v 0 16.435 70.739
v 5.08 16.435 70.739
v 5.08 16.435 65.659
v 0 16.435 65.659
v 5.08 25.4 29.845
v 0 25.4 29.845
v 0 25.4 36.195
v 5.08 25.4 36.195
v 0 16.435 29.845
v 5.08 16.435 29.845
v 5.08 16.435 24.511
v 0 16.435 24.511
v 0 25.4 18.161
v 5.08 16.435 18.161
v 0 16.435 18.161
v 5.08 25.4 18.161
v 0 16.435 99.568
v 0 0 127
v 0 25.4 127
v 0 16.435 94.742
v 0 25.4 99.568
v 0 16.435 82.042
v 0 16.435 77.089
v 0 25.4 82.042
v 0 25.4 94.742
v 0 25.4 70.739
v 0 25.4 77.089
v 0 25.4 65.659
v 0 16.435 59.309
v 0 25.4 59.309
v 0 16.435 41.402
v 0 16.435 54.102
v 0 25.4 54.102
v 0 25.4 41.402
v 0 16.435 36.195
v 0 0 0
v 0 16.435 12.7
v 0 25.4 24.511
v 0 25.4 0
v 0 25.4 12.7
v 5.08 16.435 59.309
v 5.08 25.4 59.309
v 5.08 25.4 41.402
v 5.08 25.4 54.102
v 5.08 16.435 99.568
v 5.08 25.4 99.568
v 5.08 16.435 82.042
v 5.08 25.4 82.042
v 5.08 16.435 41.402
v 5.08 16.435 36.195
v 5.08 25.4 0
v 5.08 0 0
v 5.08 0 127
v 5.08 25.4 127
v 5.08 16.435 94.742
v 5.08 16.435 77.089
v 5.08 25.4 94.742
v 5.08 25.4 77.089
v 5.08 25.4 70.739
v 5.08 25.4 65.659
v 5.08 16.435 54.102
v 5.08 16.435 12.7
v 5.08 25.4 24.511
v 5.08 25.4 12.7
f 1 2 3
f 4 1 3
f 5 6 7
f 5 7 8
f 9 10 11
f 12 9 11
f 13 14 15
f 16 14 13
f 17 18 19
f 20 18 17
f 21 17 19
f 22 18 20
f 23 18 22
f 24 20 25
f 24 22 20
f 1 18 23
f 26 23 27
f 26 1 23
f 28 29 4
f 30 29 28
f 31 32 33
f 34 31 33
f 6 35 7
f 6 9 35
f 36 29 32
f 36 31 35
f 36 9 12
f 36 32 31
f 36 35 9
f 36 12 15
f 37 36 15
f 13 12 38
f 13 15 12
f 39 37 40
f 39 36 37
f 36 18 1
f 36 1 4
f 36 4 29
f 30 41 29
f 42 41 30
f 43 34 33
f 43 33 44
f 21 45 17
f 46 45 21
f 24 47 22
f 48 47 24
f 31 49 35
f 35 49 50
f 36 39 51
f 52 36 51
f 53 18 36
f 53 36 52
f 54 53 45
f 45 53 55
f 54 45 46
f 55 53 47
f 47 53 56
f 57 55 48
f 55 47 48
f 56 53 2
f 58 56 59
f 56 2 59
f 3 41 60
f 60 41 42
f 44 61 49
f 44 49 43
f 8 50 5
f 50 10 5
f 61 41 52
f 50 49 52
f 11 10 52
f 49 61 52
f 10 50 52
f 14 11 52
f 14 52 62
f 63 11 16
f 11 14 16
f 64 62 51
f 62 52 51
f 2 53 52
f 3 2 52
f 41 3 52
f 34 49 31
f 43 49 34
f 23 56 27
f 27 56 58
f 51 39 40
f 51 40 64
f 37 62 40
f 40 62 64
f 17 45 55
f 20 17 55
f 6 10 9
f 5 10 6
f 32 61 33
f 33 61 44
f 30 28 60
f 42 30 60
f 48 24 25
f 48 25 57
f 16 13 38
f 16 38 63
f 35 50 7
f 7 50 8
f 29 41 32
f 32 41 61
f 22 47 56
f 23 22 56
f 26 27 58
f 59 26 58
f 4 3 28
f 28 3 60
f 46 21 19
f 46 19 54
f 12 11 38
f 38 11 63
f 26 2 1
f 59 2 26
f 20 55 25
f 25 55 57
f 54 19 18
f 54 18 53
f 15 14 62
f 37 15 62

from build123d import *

# Parameters (mm, degrees)
SKETCH1_W           = 5.08
SKETCH1_H           = 25.4
BOSS_EXTRUDE1_DEPTH = 127
SKETCH9_W           = 5.461
SKETCH9_H           = 8.965485494
SKETCH9_W_2         = 5.334
SKETCH9_W_3         = 5.207
SKETCH9_W_4         = 5.08
SKETCH9_W_5         = 4.953
SKETCH9_W_6         = 4.826
CUT_EXTRUDE1_DEPTH  = 12.7


with BuildPart() as part:
    # Sketch1 → Boss-Extrude1 (new body)
    with BuildSketch(Plane.XY):
        with Locations((2.54, 12.7)):
            Rectangle(SKETCH1_W, SKETCH1_H)
    extrude(amount=BOSS_EXTRUDE1_DEPTH)

    # Sketch9 → Cut-Extrude1 (cut)
    with BuildSketch(Plane(origin=(5.08, 0, 0), x_dir=(0, 0, -1), z_dir=(1, 0, 0))):
        with Locations((-15.4305, 20.917257253)):
            Rectangle(SKETCH9_W, SKETCH9_H)
        with Locations((-27.178, 20.917257253)):
            Rectangle(SKETCH9_W_2, SKETCH9_H)
        with Locations((-38.7985, 20.917257253)):
            Rectangle(SKETCH9_W_3, SKETCH9_H)
        with Locations((-56.7055, 20.917257253)):
            Rectangle(SKETCH9_W_3, SKETCH9_H)
        with Locations((-68.199, 20.917257253)):
            Rectangle(SKETCH9_W_4, SKETCH9_H)
        with Locations((-79.5655, 20.917257253)):
            Rectangle(SKETCH9_W_5, SKETCH9_H)
        with Locations((-97.155, 20.917257253)):
            Rectangle(SKETCH9_W_6, SKETCH9_H)
    extrude(amount=-CUT_EXTRUDE1_DEPTH, mode=Mode.SUBTRACT)


solid = part.part
